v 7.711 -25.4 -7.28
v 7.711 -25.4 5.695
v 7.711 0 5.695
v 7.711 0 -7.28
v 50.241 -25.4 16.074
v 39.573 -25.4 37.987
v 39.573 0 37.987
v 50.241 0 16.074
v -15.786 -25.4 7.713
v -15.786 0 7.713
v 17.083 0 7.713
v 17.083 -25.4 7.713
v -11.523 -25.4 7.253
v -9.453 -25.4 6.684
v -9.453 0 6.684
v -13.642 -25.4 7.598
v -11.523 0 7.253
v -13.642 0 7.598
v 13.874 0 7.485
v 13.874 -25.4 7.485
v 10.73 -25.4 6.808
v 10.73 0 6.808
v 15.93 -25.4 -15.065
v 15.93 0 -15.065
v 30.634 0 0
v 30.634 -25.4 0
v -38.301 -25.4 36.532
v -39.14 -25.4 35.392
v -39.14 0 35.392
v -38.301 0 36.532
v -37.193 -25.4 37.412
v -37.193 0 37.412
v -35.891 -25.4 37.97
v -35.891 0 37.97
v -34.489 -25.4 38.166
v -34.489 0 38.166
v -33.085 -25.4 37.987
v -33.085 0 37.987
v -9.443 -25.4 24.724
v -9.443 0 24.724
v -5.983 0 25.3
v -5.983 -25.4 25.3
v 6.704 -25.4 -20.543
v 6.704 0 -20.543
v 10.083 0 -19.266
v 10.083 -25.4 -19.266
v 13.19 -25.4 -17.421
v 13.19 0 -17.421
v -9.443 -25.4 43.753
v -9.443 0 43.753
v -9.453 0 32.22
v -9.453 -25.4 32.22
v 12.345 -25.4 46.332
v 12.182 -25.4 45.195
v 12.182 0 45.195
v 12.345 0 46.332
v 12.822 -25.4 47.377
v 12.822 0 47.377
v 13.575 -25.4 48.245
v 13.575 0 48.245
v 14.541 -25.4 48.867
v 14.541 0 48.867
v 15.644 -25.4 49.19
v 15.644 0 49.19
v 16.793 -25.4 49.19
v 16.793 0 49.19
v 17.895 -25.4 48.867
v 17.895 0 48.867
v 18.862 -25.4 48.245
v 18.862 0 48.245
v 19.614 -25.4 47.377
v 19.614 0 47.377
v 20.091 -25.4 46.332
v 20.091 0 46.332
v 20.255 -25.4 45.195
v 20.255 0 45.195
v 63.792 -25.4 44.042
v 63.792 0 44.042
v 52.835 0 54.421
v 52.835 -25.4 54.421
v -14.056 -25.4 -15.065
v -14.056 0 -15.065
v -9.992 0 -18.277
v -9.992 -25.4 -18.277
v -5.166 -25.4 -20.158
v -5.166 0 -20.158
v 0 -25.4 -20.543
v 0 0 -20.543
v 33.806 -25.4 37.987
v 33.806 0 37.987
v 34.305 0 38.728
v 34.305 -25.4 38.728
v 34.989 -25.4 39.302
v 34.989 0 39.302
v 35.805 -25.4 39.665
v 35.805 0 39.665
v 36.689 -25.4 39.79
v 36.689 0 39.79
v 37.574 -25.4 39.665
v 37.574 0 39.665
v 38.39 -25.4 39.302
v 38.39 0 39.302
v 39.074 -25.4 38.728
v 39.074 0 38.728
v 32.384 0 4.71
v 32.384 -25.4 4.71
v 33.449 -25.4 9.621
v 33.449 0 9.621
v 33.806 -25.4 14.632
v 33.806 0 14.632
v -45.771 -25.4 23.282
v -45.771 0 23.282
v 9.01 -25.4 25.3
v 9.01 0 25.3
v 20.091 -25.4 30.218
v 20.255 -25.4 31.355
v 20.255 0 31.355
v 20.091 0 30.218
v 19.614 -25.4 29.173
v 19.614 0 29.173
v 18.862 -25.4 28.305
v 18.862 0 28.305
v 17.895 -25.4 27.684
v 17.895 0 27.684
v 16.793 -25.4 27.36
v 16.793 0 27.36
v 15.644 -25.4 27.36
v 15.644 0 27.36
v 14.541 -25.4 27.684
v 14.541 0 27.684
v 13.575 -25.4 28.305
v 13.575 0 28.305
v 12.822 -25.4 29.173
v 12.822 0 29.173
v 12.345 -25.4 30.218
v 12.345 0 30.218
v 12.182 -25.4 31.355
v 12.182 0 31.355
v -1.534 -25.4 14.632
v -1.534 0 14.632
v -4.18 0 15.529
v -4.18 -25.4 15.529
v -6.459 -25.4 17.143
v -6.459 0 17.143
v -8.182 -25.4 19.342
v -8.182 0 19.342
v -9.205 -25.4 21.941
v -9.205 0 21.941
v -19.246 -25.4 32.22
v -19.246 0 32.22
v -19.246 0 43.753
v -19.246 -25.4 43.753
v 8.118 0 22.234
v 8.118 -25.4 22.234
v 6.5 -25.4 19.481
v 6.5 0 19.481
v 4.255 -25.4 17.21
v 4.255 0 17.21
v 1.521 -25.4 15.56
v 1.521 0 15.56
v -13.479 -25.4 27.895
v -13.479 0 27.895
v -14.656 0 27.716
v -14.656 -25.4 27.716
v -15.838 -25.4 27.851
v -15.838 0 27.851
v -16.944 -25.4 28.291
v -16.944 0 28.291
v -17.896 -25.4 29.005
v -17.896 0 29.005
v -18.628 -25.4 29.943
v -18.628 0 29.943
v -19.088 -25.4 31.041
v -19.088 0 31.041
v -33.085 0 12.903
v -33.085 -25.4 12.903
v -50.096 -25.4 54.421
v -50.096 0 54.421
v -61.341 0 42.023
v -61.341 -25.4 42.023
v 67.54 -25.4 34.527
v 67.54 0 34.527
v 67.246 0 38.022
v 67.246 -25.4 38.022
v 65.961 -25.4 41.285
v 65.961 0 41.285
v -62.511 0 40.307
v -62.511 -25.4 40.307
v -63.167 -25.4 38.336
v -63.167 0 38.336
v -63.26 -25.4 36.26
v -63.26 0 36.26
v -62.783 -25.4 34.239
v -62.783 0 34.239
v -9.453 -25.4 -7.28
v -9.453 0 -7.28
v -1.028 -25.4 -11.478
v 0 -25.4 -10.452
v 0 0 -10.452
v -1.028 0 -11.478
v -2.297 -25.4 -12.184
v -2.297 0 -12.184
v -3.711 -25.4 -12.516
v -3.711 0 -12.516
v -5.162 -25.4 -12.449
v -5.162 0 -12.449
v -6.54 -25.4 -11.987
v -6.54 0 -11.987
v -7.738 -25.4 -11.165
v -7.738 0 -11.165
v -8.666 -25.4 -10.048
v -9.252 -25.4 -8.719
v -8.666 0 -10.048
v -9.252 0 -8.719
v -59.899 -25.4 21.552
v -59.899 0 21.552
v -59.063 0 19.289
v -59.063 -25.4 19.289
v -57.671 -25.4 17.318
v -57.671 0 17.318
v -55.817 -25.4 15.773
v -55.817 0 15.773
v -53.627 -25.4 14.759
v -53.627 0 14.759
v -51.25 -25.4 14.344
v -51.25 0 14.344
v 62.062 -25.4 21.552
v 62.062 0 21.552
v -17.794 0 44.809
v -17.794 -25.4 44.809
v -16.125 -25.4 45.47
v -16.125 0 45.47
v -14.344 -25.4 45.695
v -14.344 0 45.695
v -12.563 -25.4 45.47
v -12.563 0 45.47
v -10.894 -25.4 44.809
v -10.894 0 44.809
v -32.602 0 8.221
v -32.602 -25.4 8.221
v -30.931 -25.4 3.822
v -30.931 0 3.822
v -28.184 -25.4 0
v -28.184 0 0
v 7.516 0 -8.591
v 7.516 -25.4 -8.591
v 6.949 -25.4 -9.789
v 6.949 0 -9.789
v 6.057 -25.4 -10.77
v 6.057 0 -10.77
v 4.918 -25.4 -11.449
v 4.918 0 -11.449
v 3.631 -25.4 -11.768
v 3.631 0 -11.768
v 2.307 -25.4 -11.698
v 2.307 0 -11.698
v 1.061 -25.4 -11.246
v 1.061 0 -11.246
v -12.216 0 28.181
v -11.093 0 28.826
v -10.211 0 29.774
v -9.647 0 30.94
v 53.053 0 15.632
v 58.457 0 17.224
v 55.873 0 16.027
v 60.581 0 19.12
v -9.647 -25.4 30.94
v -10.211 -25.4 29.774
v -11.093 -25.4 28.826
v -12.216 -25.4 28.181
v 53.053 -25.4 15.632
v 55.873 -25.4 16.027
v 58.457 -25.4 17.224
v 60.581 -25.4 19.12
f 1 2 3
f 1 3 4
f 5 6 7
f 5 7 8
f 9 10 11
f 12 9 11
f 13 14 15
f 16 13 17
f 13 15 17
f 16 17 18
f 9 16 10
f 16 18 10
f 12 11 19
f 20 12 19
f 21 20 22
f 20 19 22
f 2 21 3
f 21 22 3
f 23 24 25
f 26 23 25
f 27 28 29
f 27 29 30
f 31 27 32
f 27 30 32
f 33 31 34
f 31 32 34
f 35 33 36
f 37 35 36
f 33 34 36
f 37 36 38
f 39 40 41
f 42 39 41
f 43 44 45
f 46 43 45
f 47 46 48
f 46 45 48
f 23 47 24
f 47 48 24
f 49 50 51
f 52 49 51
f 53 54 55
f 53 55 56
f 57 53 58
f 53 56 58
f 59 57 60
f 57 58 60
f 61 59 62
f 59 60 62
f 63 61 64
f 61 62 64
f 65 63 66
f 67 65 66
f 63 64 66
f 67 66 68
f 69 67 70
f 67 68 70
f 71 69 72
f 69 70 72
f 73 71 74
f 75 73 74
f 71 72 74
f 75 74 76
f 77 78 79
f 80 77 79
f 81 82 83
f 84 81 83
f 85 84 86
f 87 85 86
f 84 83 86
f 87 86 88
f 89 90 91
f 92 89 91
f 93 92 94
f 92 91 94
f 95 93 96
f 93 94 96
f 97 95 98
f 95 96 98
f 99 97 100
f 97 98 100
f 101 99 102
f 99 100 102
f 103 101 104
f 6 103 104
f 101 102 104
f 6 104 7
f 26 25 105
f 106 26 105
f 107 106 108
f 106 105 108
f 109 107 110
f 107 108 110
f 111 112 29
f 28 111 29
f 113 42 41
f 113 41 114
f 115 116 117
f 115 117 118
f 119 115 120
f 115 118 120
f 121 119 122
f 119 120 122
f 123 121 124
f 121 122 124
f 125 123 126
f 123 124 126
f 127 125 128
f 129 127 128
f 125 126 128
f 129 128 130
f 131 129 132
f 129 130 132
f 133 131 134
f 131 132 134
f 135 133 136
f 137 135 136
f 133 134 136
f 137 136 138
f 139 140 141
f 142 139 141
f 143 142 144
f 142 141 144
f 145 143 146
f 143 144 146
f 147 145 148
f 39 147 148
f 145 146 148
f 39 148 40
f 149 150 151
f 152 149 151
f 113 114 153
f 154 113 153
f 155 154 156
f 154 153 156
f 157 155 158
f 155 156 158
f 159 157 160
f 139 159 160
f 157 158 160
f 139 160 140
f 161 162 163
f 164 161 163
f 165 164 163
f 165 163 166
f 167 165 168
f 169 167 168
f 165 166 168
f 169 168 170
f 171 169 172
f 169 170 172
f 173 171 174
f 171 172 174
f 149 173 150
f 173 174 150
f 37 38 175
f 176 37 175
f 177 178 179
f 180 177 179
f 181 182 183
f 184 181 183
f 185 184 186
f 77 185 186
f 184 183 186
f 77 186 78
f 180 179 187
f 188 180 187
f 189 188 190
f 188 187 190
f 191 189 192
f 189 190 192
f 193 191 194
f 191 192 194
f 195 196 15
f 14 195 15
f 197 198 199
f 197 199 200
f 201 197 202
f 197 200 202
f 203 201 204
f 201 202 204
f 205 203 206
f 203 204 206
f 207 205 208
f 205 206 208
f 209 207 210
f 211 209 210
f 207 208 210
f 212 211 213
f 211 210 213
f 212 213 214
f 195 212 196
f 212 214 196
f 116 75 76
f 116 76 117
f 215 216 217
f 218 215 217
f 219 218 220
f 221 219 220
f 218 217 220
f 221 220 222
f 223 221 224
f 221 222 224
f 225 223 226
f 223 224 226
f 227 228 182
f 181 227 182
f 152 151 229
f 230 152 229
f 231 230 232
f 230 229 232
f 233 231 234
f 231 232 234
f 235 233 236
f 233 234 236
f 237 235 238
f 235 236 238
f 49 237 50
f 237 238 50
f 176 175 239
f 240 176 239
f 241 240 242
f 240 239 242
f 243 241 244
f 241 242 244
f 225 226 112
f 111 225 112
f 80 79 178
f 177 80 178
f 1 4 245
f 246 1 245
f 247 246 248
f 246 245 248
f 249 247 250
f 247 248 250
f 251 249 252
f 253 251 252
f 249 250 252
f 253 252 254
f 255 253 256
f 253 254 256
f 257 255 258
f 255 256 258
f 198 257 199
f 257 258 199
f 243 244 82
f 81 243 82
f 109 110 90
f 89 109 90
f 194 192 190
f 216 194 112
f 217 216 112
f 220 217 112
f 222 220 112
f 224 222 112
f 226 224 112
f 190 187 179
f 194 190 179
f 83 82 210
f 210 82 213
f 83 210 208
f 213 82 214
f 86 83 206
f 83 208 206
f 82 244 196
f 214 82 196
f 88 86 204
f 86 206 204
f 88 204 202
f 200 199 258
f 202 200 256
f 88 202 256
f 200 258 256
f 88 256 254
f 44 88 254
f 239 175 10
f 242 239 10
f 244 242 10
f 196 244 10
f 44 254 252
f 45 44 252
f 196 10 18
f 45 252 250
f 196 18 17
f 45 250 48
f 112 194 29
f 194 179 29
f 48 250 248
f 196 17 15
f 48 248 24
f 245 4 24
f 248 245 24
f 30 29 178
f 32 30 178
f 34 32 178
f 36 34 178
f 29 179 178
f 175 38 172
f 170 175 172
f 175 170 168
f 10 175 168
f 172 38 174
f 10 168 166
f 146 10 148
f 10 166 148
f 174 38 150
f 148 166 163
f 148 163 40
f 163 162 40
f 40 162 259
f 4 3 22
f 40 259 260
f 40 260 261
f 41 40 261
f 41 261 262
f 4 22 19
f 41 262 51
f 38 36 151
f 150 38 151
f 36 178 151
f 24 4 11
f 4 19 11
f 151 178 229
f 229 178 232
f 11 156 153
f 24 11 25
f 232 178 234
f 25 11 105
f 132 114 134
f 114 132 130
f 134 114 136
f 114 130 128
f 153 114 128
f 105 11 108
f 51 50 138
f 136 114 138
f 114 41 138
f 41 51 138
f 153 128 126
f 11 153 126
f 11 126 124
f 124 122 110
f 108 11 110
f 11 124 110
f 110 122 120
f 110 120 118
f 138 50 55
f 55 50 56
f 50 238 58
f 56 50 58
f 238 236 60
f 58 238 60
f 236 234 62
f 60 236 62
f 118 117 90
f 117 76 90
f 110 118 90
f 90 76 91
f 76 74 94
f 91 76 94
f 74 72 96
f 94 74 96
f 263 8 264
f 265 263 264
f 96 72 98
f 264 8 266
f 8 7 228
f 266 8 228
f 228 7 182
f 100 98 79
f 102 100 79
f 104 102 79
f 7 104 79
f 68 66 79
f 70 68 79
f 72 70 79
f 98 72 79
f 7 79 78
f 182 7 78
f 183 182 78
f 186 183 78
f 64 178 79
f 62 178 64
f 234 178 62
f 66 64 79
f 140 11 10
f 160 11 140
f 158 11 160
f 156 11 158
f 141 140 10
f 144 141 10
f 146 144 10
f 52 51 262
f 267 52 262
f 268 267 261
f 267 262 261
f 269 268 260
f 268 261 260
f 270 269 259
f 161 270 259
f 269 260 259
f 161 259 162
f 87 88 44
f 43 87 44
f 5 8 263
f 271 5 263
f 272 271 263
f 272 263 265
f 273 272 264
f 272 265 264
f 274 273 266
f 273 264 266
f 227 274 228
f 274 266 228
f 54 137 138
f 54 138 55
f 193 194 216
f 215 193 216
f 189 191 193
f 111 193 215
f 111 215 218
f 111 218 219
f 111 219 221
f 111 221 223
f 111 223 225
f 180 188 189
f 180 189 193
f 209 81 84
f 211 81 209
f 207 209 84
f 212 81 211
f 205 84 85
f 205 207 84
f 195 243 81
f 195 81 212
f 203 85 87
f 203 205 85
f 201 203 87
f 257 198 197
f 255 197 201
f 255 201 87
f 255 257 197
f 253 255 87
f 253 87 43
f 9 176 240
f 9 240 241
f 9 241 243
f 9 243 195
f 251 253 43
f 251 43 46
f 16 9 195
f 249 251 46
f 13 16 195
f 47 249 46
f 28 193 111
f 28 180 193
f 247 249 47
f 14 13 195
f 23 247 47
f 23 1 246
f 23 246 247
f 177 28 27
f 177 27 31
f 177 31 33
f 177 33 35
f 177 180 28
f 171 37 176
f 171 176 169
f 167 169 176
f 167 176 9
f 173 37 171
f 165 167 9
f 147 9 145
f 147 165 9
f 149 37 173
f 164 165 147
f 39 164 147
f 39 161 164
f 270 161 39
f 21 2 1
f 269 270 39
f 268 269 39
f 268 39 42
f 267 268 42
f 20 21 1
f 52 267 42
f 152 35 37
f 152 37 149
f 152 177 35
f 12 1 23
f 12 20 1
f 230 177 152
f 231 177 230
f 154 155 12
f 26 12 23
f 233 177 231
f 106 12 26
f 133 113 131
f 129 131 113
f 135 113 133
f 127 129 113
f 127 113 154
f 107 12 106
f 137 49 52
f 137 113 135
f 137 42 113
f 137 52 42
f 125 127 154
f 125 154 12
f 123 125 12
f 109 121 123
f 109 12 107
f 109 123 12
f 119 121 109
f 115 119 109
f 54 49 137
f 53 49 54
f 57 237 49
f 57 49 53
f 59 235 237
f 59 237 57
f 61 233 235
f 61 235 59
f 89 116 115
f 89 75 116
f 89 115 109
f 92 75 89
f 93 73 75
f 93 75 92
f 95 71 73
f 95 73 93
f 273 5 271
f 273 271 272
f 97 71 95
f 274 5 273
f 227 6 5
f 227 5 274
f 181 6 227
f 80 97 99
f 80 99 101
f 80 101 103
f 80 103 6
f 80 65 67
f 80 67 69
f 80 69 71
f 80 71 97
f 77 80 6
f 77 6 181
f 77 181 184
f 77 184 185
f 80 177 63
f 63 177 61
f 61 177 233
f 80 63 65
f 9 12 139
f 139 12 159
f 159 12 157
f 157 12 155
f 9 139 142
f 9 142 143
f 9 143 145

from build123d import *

# Parameters (mm, degrees)
F1_DEPTH = 25.4


with BuildPart() as f1:
    # F0 (on Front) → F1 (new body)
    with BuildSketch(Plane.XZ):
        with BuildLine():
            ThreePointArc((-39.140027, 35.391811), (-36.560582, 37.734512), (-33.085216, 37.986729))
            Line((-33.085216, 37.986729), (-33.085216, 12.902514))
            ThreePointArc((-33.085216, 12.902514), (-31.90952, 5.966876), (-28.183702, 0))
            Line((-28.183702, 0), (-14.055812, -15.064946))
            ThreePointArc((-14.055812, -15.064946), (-7.648839, -19.397211), (0, -20.543108))
            Line((0, -20.543108), (6.70354, -20.543108))
            ThreePointArc((6.70354, -20.543108), (11.677188, -18.411115), (15.929919, -15.064946))
            Line((15.929919, -15.064946), (30.634461, 0))
            ThreePointArc((30.634461, 0), (33.004035, 7.146345), (33.806026, 14.632461))
            Line((33.806026, 14.632461), (33.806026, 37.986729))
            ThreePointArc((33.806026, 37.986729), (36.68927, 39.789823), (39.572515, 37.986729))
            Line((39.572515, 37.986729), (50.240513, 16.074082))
            ThreePointArc((50.240513, 16.074082), (57.20934, 16.529722), (62.061809, 21.552242))
            Line((62.061809, 21.552242), (67.539975, 34.526836))
            ThreePointArc((67.539975, 34.526836), (66.722582, 39.70047), (63.791759, 44.04154))
            Line((63.791759, 44.04154), (52.835435, 54.421216))
            Line((52.835435, 54.421216), (25.156297, 54.421216))
            Line((25.156297, 54.421216), (22.849701, 54.421216))
            Line((22.849701, 54.421216), (5.261919, 54.421216))
            Line((5.261919, 54.421216), (-50.096352, 54.421216))
            Line((-50.096352, 54.421216), (-61.340999, 42.023271))
            ThreePointArc((-61.340999, 42.023271), (-63.167493, 38.335649), (-62.782623, 34.238514))
            Line((-62.782623, 34.238514), (-59.899379, 21.552242))
            ThreePointArc((-59.899379, 21.552242), (-56.794074, 16.484717), (-51.249649, 14.344135))
            Line((-51.249649, 14.344135), (-45.771487, 23.282189))
            Line((-45.771487, 23.282189), (-39.140027, 35.391811))
        make_face()
        with BuildLine():
            Line((-15.785757, 7.712676), (-9.452744, 7.712676))
            Line((-9.452744, 7.712676), (17.083218, 7.712676))
            ThreePointArc((17.083218, 7.712676), (12.289972, 7.202582), (7.711429, 5.695148))
            Line((7.711429, 5.695148), (7.711429, -7.280189))
            ThreePointArc((7.711429, -7.280189), (4.918177, -11.449271), (0, -10.451756))
            ThreePointArc((0, -10.451756), (-5.866974, -12.265498), (-9.452744, -7.280189))
            Line((-9.452744, -7.280189), (-9.452744, 6.684112))
            ThreePointArc((-9.452744, 6.684112), (-12.577759, 7.453861), (-15.785757, 7.712676))
        make_face(mode=Mode.SUBTRACT)
        with BuildLine():
            Line((-9.442623, 24.723811), (-5.982729, 25.300462))
            Line((-5.982729, 25.300462), (9.010135, 25.300462))
            ThreePointArc((9.010135, 25.300462), (5.448393, 18.275855), (-1.534213, 14.632461))
            ThreePointArc((-1.534213, 14.632461), (-7.400178, 18.179924), (-9.442623, 24.723811))
        make_face(mode=Mode.SUBTRACT)
        with BuildLine():
            Line((-19.245649, 32.220244), (-19.245649, 43.753218))
            ThreePointArc((-19.245649, 43.753218), (-14.344136, 45.695412), (-9.442623, 43.753218))
            Line((-9.442623, 43.753218), (-9.452744, 32.220244))
            ThreePointArc((-9.452744, 32.220244), (-10.616261, 29.266754), (-13.479163, 27.895378))
            ThreePointArc((-13.479163, 27.895378), (-17.443622, 28.61619), (-19.245649, 32.220244))
        make_face(mode=Mode.SUBTRACT)
        with BuildLine():
            Line((12.181703, 31.355269), (12.181703, 45.194838))
            ThreePointArc((12.181703, 45.194838), (16.218243, 49.231378), (20.254783, 45.194838))
            Line((20.254783, 45.194838), (20.254783, 31.355269))
            ThreePointArc((20.254783, 31.355269), (16.218243, 27.318729), (12.181703, 31.355269))
        make_face(mode=Mode.SUBTRACT)
    extrude(amount=F1_DEPTH)


solid = f1.part
